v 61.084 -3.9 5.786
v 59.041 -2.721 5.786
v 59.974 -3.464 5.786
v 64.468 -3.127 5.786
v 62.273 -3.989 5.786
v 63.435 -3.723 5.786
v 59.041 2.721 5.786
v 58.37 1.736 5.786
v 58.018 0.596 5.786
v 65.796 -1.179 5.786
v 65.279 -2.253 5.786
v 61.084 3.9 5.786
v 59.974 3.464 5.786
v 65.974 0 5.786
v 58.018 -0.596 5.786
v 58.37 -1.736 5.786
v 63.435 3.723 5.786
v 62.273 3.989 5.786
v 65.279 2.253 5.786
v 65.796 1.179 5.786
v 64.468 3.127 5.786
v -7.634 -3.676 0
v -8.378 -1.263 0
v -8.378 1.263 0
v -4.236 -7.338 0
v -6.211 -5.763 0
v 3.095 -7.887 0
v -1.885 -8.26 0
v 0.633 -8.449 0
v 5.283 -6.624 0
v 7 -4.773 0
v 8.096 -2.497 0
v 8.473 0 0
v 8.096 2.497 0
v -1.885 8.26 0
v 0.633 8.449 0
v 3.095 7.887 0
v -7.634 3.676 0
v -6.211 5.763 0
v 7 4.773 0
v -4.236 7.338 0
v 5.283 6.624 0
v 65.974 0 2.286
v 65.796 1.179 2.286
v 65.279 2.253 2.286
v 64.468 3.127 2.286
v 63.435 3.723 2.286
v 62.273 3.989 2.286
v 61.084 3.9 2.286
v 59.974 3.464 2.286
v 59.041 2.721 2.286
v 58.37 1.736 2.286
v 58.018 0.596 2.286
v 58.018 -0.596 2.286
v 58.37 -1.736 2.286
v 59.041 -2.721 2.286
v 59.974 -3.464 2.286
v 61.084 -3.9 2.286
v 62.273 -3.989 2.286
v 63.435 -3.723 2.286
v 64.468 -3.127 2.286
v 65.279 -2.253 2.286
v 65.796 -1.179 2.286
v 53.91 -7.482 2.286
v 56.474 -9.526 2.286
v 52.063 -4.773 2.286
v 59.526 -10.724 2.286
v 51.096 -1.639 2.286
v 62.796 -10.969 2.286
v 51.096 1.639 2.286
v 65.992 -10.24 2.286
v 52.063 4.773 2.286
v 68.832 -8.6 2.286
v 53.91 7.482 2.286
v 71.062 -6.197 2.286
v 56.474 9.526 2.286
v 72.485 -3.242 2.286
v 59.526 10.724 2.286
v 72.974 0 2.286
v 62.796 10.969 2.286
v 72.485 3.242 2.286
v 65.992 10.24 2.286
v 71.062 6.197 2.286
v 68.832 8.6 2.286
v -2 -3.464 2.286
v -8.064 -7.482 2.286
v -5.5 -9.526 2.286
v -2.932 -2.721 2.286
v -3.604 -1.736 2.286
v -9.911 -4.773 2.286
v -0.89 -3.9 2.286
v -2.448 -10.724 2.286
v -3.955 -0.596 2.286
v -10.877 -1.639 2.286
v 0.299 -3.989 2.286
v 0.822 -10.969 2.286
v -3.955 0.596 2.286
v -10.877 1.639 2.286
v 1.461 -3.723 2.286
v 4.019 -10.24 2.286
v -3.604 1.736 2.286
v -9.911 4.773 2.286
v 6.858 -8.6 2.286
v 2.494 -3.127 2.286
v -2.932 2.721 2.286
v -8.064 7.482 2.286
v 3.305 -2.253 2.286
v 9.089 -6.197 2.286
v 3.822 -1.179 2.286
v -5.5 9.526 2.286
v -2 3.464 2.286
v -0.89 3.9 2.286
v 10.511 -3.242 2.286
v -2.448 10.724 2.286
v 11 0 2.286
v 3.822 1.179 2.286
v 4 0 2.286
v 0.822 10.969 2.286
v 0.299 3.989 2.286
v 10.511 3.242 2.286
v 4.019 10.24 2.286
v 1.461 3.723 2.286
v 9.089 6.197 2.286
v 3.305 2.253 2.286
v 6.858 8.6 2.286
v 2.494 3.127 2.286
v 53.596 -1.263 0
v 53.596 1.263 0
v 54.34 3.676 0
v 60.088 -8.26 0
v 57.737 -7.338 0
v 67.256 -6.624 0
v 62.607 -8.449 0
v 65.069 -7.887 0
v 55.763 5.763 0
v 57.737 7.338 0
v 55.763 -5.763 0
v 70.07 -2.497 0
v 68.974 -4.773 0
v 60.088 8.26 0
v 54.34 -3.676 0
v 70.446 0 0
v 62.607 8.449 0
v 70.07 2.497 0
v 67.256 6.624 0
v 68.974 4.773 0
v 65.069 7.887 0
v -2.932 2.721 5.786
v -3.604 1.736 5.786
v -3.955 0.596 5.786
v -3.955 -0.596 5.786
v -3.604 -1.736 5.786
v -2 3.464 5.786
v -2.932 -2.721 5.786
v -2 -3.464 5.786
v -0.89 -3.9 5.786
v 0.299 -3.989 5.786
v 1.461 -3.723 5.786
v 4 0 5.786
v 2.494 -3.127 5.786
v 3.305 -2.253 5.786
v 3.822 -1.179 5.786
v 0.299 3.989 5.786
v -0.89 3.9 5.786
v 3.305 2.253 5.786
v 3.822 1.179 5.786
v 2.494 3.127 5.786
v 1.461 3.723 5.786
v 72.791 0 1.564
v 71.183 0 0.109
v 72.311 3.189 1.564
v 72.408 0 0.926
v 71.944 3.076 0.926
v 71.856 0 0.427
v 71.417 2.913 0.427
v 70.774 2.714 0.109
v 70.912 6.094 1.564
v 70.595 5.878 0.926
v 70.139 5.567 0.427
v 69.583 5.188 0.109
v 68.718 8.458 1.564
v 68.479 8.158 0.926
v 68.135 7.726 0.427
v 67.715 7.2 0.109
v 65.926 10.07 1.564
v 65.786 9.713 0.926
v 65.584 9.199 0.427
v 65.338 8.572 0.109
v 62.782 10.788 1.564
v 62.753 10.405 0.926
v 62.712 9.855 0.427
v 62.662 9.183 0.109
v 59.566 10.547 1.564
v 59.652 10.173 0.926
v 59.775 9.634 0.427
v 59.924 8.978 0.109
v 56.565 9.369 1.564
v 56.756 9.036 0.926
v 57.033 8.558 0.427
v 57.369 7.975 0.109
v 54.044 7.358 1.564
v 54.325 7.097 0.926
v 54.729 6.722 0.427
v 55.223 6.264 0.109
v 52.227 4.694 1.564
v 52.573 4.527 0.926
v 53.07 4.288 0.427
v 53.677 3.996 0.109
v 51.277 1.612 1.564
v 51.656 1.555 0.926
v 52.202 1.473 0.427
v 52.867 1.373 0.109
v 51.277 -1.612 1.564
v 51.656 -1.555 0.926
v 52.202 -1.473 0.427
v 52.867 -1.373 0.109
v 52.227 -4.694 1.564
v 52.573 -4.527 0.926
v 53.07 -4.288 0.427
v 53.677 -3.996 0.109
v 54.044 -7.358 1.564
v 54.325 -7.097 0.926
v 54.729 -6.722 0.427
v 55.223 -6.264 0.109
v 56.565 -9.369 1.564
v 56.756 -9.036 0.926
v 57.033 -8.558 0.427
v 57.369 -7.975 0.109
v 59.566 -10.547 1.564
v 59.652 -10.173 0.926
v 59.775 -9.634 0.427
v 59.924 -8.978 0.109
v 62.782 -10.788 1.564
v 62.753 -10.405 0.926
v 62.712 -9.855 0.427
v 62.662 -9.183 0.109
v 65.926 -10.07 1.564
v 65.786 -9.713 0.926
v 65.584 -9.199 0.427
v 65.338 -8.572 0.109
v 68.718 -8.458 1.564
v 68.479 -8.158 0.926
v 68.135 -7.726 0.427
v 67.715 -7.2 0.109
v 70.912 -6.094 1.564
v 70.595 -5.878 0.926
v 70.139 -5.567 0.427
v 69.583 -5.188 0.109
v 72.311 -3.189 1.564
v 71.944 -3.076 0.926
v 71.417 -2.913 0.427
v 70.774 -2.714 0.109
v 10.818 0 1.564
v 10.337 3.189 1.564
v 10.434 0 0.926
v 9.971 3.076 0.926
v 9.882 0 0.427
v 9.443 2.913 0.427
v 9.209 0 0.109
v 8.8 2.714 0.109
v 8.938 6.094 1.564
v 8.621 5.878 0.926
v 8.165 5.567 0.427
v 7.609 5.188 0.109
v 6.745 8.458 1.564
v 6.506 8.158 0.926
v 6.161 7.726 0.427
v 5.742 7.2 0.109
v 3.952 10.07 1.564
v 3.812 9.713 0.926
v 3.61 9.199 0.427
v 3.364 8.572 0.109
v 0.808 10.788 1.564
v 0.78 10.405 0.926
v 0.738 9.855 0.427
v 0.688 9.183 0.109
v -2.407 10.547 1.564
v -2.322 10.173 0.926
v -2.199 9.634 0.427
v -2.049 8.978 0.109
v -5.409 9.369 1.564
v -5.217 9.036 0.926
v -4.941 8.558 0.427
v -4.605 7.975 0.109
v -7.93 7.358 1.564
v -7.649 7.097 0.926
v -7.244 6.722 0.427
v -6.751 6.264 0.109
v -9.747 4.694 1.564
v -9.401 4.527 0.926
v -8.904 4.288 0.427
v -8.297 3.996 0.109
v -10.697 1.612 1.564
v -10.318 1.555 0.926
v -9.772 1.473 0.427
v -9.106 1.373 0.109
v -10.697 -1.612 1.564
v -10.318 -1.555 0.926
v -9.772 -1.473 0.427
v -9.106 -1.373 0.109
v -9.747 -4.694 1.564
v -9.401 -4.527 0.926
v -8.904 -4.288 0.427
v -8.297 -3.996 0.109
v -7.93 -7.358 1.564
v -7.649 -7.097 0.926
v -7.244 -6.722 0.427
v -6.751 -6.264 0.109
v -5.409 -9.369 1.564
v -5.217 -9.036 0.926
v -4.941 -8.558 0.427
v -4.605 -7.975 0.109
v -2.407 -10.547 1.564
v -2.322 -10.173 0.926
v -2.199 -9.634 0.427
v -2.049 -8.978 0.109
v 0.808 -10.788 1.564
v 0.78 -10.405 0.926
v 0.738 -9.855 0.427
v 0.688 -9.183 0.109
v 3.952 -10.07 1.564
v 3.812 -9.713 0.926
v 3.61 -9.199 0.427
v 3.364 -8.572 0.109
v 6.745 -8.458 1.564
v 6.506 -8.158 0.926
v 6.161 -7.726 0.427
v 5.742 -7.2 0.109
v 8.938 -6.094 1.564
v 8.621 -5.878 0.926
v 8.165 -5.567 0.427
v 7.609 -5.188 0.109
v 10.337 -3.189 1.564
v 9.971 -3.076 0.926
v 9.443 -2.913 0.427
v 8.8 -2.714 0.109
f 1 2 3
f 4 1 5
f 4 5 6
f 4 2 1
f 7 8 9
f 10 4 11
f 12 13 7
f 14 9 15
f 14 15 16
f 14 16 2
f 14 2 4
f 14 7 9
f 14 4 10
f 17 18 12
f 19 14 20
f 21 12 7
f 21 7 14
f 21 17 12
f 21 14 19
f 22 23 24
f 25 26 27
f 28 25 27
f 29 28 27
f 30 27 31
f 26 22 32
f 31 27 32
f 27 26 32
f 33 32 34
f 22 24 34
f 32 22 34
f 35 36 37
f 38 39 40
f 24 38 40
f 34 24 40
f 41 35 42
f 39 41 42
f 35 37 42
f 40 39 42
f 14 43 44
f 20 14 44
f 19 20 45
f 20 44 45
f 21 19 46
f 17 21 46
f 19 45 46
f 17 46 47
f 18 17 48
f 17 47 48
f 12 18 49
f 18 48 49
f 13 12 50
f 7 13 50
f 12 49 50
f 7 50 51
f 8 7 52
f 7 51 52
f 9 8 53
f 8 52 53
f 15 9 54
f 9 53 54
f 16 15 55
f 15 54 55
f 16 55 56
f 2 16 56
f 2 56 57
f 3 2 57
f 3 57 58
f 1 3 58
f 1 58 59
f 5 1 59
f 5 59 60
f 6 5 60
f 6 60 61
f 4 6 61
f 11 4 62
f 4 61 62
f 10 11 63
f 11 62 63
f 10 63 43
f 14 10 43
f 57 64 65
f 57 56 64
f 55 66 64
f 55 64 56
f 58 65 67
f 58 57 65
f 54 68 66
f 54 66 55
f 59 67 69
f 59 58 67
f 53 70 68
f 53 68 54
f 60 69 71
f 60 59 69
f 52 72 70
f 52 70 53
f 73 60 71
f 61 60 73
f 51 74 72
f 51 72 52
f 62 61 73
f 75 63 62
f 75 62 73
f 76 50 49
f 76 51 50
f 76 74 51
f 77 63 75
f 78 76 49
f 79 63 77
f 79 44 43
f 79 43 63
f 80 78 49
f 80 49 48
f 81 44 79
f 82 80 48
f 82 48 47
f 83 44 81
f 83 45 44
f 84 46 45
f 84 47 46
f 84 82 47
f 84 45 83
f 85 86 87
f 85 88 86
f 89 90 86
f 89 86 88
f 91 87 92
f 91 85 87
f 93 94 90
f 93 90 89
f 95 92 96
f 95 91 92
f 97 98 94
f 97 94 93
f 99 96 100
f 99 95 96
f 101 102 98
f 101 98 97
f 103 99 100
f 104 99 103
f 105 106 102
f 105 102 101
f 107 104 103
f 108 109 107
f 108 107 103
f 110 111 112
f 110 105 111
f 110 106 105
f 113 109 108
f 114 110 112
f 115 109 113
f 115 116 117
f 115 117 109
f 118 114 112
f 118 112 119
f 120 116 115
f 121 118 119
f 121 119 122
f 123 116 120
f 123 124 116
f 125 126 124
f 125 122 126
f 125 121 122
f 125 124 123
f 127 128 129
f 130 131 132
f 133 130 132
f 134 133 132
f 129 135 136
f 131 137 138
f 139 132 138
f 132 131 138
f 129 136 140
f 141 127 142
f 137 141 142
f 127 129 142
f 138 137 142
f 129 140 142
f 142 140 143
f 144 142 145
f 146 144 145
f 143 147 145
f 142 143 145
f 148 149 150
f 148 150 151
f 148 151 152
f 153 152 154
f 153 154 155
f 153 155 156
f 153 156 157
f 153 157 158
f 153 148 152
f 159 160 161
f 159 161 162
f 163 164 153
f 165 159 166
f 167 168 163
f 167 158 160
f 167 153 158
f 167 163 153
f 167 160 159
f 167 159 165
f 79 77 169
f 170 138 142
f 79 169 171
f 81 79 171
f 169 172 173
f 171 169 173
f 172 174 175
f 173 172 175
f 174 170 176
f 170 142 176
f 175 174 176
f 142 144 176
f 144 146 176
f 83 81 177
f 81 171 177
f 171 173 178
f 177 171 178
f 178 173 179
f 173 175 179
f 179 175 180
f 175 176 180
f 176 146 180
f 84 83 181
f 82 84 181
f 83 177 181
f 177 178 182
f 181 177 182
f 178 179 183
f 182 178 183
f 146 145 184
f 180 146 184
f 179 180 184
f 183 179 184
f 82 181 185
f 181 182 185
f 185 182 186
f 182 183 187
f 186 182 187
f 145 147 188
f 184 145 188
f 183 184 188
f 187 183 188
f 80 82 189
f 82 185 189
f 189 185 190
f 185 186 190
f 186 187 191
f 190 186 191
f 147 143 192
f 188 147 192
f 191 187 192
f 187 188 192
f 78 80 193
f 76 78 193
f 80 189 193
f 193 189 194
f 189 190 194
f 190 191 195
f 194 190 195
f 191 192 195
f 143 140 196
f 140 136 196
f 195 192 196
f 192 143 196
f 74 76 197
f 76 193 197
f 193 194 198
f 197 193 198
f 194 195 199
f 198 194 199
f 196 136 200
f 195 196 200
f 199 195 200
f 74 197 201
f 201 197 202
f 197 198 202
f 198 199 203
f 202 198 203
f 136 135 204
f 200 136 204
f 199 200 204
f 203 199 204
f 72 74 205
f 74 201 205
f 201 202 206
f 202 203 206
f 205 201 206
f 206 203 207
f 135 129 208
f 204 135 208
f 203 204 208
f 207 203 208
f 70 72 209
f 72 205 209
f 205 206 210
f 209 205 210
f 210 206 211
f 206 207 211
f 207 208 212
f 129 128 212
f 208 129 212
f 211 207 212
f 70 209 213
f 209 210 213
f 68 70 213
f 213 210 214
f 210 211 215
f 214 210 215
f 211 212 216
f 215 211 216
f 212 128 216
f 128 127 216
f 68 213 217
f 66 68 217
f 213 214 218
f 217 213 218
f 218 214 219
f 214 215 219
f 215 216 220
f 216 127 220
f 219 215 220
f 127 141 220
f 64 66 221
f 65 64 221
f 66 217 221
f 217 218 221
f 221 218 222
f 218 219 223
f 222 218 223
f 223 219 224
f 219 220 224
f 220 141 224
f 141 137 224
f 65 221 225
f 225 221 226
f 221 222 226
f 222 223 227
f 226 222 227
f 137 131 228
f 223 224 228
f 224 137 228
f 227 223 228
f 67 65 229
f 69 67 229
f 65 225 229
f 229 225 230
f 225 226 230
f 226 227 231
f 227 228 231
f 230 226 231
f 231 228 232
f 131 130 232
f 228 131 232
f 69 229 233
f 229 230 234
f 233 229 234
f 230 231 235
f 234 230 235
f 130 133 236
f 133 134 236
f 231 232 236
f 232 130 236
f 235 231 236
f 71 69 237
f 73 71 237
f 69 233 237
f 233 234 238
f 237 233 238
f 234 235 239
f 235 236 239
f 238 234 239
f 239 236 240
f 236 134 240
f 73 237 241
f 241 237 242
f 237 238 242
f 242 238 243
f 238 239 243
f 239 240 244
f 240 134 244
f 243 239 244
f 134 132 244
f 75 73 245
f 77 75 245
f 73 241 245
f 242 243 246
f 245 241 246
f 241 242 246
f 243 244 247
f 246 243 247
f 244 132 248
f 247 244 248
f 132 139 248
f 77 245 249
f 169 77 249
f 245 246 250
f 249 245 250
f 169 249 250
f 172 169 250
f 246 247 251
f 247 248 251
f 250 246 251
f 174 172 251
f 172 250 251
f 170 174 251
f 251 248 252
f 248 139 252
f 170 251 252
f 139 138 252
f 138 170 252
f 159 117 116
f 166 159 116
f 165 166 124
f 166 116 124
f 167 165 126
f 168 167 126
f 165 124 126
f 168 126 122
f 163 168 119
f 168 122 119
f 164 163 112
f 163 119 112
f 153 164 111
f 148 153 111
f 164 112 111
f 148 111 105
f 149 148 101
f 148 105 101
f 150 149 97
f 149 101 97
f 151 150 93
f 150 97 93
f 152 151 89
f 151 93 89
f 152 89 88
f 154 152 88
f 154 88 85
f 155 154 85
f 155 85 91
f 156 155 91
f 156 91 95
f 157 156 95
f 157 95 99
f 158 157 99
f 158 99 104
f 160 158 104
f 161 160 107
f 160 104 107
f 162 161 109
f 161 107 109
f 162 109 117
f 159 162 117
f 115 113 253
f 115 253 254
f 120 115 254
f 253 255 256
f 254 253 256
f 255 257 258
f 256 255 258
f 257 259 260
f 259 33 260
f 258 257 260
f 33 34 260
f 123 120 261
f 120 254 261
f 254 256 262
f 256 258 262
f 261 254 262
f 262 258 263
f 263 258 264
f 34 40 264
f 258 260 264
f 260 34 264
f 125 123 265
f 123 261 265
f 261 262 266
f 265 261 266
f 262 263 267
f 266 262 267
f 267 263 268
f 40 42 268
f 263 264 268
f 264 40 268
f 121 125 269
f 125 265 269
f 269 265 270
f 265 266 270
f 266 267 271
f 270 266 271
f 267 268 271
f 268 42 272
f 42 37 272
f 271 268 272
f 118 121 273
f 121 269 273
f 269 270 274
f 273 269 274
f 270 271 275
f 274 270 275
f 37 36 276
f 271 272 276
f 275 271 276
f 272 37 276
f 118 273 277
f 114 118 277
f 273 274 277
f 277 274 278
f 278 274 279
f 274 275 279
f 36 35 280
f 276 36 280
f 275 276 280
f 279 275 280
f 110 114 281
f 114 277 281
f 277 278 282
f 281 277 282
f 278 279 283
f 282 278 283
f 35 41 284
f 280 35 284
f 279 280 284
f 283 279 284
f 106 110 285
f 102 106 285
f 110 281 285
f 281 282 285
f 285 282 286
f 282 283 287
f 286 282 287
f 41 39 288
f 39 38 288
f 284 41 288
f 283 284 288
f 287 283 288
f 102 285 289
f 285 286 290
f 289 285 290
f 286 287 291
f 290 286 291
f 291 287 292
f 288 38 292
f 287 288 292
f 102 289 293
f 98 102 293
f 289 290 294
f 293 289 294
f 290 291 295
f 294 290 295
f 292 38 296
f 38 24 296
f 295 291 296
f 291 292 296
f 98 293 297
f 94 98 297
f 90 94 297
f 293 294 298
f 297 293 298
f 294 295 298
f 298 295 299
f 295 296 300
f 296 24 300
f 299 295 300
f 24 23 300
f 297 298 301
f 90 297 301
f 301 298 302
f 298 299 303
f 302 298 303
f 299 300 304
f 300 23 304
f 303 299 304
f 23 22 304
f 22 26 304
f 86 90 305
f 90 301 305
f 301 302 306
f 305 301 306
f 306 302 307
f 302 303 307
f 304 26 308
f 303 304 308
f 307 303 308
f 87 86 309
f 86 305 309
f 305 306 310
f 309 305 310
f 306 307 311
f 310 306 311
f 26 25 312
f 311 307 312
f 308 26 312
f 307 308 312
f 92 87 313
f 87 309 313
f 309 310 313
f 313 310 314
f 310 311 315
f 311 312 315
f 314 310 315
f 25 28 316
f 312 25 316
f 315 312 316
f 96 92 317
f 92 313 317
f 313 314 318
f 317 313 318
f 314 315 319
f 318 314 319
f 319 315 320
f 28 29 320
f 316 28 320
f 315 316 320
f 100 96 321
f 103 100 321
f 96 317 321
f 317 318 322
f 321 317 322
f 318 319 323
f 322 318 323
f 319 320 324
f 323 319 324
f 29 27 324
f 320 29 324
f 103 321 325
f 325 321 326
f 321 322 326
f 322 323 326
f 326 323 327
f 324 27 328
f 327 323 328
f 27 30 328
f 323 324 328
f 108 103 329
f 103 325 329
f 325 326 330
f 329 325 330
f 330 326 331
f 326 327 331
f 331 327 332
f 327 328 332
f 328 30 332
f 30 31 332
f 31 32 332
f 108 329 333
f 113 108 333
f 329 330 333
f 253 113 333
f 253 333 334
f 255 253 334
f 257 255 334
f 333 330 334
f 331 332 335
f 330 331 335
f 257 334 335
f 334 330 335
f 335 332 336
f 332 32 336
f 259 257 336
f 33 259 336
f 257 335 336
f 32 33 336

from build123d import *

# Parameters (mm, degrees)
F0_R     = 11
F1_DEPTH = 2.286
F2_R     = 4
F3_DEPTH = 3.5
F5_R     = 11
F6_DEPTH = 2.286
F7_R     = 4
F8_DEPTH = 3.5


# Not quite as in the source:
# - a fillet or chamfer that OpenCascade refuses, or shapes differently, is made with other operations: its cross-section is extruded or revolved along the edge and cut away or added


with BuildPart() as f1:
    # F0 (on Top) → F1 (new body)
    with BuildSketch(Plane.XY):
        Circle(F0_R)
    extrude(amount=F1_DEPTH)

    # F2 (on face) → F3 (join)
    with BuildSketch(Plane.XY.offset(2.286)):
        Circle(F2_R)
    extrude(amount=F3_DEPTH)

    # F4: fillet of radius 2.54 on 1 edges, made by hand

    # F4_s1 → F4_t2 (revolve, cut)
    with BuildSketch(Plane.XZ):
        with BuildLine():
            ThreePointArc((11, 2.286), (10.1766157086, 0.6562855843), (8.4727319097, 0))
            Line((8.4727319097, 0), (11, 0))
            Line((11, 0), (11, 2.286))
        make_face()
    revolve(axis=Axis((0, 0, 0), (0, 0, 1)), mode=Mode.SUBTRACT)


with BuildPart() as f6:
    # F5 (on Top) → F6 (new body)
    with BuildSketch(Plane.XY):
        with Locations((61.9736175734, 0)):
            Circle(F5_R)
    extrude(amount=F6_DEPTH)

    # F7 (on face) → F8 (join)
    with BuildSketch(Plane.XY.offset(2.286)):
        with Locations((61.9736175734, 0)):
            Circle(F7_R)
    extrude(amount=F8_DEPTH)

    # F9: fillet of radius 2.54 on 1 edges, made by hand

    # F9_s1 → F9_t2 (revolve, cut)
    with BuildSketch(Plane.XZ):
        with BuildLine():
            ThreePointArc((72.9736175734, 2.286), (72.150233282, 0.6562855843), (70.4463494832, 0))
            Line((70.4463494832, 0), (72.9736175734, 0))
            Line((72.9736175734, 0), (72.9736175734, 2.286))
        make_face()
    revolve(axis=Axis((61.9736175734, 0, 0), (0, 0, 1)), mode=Mode.SUBTRACT)


solid = Compound([f1.part, f6.part])
